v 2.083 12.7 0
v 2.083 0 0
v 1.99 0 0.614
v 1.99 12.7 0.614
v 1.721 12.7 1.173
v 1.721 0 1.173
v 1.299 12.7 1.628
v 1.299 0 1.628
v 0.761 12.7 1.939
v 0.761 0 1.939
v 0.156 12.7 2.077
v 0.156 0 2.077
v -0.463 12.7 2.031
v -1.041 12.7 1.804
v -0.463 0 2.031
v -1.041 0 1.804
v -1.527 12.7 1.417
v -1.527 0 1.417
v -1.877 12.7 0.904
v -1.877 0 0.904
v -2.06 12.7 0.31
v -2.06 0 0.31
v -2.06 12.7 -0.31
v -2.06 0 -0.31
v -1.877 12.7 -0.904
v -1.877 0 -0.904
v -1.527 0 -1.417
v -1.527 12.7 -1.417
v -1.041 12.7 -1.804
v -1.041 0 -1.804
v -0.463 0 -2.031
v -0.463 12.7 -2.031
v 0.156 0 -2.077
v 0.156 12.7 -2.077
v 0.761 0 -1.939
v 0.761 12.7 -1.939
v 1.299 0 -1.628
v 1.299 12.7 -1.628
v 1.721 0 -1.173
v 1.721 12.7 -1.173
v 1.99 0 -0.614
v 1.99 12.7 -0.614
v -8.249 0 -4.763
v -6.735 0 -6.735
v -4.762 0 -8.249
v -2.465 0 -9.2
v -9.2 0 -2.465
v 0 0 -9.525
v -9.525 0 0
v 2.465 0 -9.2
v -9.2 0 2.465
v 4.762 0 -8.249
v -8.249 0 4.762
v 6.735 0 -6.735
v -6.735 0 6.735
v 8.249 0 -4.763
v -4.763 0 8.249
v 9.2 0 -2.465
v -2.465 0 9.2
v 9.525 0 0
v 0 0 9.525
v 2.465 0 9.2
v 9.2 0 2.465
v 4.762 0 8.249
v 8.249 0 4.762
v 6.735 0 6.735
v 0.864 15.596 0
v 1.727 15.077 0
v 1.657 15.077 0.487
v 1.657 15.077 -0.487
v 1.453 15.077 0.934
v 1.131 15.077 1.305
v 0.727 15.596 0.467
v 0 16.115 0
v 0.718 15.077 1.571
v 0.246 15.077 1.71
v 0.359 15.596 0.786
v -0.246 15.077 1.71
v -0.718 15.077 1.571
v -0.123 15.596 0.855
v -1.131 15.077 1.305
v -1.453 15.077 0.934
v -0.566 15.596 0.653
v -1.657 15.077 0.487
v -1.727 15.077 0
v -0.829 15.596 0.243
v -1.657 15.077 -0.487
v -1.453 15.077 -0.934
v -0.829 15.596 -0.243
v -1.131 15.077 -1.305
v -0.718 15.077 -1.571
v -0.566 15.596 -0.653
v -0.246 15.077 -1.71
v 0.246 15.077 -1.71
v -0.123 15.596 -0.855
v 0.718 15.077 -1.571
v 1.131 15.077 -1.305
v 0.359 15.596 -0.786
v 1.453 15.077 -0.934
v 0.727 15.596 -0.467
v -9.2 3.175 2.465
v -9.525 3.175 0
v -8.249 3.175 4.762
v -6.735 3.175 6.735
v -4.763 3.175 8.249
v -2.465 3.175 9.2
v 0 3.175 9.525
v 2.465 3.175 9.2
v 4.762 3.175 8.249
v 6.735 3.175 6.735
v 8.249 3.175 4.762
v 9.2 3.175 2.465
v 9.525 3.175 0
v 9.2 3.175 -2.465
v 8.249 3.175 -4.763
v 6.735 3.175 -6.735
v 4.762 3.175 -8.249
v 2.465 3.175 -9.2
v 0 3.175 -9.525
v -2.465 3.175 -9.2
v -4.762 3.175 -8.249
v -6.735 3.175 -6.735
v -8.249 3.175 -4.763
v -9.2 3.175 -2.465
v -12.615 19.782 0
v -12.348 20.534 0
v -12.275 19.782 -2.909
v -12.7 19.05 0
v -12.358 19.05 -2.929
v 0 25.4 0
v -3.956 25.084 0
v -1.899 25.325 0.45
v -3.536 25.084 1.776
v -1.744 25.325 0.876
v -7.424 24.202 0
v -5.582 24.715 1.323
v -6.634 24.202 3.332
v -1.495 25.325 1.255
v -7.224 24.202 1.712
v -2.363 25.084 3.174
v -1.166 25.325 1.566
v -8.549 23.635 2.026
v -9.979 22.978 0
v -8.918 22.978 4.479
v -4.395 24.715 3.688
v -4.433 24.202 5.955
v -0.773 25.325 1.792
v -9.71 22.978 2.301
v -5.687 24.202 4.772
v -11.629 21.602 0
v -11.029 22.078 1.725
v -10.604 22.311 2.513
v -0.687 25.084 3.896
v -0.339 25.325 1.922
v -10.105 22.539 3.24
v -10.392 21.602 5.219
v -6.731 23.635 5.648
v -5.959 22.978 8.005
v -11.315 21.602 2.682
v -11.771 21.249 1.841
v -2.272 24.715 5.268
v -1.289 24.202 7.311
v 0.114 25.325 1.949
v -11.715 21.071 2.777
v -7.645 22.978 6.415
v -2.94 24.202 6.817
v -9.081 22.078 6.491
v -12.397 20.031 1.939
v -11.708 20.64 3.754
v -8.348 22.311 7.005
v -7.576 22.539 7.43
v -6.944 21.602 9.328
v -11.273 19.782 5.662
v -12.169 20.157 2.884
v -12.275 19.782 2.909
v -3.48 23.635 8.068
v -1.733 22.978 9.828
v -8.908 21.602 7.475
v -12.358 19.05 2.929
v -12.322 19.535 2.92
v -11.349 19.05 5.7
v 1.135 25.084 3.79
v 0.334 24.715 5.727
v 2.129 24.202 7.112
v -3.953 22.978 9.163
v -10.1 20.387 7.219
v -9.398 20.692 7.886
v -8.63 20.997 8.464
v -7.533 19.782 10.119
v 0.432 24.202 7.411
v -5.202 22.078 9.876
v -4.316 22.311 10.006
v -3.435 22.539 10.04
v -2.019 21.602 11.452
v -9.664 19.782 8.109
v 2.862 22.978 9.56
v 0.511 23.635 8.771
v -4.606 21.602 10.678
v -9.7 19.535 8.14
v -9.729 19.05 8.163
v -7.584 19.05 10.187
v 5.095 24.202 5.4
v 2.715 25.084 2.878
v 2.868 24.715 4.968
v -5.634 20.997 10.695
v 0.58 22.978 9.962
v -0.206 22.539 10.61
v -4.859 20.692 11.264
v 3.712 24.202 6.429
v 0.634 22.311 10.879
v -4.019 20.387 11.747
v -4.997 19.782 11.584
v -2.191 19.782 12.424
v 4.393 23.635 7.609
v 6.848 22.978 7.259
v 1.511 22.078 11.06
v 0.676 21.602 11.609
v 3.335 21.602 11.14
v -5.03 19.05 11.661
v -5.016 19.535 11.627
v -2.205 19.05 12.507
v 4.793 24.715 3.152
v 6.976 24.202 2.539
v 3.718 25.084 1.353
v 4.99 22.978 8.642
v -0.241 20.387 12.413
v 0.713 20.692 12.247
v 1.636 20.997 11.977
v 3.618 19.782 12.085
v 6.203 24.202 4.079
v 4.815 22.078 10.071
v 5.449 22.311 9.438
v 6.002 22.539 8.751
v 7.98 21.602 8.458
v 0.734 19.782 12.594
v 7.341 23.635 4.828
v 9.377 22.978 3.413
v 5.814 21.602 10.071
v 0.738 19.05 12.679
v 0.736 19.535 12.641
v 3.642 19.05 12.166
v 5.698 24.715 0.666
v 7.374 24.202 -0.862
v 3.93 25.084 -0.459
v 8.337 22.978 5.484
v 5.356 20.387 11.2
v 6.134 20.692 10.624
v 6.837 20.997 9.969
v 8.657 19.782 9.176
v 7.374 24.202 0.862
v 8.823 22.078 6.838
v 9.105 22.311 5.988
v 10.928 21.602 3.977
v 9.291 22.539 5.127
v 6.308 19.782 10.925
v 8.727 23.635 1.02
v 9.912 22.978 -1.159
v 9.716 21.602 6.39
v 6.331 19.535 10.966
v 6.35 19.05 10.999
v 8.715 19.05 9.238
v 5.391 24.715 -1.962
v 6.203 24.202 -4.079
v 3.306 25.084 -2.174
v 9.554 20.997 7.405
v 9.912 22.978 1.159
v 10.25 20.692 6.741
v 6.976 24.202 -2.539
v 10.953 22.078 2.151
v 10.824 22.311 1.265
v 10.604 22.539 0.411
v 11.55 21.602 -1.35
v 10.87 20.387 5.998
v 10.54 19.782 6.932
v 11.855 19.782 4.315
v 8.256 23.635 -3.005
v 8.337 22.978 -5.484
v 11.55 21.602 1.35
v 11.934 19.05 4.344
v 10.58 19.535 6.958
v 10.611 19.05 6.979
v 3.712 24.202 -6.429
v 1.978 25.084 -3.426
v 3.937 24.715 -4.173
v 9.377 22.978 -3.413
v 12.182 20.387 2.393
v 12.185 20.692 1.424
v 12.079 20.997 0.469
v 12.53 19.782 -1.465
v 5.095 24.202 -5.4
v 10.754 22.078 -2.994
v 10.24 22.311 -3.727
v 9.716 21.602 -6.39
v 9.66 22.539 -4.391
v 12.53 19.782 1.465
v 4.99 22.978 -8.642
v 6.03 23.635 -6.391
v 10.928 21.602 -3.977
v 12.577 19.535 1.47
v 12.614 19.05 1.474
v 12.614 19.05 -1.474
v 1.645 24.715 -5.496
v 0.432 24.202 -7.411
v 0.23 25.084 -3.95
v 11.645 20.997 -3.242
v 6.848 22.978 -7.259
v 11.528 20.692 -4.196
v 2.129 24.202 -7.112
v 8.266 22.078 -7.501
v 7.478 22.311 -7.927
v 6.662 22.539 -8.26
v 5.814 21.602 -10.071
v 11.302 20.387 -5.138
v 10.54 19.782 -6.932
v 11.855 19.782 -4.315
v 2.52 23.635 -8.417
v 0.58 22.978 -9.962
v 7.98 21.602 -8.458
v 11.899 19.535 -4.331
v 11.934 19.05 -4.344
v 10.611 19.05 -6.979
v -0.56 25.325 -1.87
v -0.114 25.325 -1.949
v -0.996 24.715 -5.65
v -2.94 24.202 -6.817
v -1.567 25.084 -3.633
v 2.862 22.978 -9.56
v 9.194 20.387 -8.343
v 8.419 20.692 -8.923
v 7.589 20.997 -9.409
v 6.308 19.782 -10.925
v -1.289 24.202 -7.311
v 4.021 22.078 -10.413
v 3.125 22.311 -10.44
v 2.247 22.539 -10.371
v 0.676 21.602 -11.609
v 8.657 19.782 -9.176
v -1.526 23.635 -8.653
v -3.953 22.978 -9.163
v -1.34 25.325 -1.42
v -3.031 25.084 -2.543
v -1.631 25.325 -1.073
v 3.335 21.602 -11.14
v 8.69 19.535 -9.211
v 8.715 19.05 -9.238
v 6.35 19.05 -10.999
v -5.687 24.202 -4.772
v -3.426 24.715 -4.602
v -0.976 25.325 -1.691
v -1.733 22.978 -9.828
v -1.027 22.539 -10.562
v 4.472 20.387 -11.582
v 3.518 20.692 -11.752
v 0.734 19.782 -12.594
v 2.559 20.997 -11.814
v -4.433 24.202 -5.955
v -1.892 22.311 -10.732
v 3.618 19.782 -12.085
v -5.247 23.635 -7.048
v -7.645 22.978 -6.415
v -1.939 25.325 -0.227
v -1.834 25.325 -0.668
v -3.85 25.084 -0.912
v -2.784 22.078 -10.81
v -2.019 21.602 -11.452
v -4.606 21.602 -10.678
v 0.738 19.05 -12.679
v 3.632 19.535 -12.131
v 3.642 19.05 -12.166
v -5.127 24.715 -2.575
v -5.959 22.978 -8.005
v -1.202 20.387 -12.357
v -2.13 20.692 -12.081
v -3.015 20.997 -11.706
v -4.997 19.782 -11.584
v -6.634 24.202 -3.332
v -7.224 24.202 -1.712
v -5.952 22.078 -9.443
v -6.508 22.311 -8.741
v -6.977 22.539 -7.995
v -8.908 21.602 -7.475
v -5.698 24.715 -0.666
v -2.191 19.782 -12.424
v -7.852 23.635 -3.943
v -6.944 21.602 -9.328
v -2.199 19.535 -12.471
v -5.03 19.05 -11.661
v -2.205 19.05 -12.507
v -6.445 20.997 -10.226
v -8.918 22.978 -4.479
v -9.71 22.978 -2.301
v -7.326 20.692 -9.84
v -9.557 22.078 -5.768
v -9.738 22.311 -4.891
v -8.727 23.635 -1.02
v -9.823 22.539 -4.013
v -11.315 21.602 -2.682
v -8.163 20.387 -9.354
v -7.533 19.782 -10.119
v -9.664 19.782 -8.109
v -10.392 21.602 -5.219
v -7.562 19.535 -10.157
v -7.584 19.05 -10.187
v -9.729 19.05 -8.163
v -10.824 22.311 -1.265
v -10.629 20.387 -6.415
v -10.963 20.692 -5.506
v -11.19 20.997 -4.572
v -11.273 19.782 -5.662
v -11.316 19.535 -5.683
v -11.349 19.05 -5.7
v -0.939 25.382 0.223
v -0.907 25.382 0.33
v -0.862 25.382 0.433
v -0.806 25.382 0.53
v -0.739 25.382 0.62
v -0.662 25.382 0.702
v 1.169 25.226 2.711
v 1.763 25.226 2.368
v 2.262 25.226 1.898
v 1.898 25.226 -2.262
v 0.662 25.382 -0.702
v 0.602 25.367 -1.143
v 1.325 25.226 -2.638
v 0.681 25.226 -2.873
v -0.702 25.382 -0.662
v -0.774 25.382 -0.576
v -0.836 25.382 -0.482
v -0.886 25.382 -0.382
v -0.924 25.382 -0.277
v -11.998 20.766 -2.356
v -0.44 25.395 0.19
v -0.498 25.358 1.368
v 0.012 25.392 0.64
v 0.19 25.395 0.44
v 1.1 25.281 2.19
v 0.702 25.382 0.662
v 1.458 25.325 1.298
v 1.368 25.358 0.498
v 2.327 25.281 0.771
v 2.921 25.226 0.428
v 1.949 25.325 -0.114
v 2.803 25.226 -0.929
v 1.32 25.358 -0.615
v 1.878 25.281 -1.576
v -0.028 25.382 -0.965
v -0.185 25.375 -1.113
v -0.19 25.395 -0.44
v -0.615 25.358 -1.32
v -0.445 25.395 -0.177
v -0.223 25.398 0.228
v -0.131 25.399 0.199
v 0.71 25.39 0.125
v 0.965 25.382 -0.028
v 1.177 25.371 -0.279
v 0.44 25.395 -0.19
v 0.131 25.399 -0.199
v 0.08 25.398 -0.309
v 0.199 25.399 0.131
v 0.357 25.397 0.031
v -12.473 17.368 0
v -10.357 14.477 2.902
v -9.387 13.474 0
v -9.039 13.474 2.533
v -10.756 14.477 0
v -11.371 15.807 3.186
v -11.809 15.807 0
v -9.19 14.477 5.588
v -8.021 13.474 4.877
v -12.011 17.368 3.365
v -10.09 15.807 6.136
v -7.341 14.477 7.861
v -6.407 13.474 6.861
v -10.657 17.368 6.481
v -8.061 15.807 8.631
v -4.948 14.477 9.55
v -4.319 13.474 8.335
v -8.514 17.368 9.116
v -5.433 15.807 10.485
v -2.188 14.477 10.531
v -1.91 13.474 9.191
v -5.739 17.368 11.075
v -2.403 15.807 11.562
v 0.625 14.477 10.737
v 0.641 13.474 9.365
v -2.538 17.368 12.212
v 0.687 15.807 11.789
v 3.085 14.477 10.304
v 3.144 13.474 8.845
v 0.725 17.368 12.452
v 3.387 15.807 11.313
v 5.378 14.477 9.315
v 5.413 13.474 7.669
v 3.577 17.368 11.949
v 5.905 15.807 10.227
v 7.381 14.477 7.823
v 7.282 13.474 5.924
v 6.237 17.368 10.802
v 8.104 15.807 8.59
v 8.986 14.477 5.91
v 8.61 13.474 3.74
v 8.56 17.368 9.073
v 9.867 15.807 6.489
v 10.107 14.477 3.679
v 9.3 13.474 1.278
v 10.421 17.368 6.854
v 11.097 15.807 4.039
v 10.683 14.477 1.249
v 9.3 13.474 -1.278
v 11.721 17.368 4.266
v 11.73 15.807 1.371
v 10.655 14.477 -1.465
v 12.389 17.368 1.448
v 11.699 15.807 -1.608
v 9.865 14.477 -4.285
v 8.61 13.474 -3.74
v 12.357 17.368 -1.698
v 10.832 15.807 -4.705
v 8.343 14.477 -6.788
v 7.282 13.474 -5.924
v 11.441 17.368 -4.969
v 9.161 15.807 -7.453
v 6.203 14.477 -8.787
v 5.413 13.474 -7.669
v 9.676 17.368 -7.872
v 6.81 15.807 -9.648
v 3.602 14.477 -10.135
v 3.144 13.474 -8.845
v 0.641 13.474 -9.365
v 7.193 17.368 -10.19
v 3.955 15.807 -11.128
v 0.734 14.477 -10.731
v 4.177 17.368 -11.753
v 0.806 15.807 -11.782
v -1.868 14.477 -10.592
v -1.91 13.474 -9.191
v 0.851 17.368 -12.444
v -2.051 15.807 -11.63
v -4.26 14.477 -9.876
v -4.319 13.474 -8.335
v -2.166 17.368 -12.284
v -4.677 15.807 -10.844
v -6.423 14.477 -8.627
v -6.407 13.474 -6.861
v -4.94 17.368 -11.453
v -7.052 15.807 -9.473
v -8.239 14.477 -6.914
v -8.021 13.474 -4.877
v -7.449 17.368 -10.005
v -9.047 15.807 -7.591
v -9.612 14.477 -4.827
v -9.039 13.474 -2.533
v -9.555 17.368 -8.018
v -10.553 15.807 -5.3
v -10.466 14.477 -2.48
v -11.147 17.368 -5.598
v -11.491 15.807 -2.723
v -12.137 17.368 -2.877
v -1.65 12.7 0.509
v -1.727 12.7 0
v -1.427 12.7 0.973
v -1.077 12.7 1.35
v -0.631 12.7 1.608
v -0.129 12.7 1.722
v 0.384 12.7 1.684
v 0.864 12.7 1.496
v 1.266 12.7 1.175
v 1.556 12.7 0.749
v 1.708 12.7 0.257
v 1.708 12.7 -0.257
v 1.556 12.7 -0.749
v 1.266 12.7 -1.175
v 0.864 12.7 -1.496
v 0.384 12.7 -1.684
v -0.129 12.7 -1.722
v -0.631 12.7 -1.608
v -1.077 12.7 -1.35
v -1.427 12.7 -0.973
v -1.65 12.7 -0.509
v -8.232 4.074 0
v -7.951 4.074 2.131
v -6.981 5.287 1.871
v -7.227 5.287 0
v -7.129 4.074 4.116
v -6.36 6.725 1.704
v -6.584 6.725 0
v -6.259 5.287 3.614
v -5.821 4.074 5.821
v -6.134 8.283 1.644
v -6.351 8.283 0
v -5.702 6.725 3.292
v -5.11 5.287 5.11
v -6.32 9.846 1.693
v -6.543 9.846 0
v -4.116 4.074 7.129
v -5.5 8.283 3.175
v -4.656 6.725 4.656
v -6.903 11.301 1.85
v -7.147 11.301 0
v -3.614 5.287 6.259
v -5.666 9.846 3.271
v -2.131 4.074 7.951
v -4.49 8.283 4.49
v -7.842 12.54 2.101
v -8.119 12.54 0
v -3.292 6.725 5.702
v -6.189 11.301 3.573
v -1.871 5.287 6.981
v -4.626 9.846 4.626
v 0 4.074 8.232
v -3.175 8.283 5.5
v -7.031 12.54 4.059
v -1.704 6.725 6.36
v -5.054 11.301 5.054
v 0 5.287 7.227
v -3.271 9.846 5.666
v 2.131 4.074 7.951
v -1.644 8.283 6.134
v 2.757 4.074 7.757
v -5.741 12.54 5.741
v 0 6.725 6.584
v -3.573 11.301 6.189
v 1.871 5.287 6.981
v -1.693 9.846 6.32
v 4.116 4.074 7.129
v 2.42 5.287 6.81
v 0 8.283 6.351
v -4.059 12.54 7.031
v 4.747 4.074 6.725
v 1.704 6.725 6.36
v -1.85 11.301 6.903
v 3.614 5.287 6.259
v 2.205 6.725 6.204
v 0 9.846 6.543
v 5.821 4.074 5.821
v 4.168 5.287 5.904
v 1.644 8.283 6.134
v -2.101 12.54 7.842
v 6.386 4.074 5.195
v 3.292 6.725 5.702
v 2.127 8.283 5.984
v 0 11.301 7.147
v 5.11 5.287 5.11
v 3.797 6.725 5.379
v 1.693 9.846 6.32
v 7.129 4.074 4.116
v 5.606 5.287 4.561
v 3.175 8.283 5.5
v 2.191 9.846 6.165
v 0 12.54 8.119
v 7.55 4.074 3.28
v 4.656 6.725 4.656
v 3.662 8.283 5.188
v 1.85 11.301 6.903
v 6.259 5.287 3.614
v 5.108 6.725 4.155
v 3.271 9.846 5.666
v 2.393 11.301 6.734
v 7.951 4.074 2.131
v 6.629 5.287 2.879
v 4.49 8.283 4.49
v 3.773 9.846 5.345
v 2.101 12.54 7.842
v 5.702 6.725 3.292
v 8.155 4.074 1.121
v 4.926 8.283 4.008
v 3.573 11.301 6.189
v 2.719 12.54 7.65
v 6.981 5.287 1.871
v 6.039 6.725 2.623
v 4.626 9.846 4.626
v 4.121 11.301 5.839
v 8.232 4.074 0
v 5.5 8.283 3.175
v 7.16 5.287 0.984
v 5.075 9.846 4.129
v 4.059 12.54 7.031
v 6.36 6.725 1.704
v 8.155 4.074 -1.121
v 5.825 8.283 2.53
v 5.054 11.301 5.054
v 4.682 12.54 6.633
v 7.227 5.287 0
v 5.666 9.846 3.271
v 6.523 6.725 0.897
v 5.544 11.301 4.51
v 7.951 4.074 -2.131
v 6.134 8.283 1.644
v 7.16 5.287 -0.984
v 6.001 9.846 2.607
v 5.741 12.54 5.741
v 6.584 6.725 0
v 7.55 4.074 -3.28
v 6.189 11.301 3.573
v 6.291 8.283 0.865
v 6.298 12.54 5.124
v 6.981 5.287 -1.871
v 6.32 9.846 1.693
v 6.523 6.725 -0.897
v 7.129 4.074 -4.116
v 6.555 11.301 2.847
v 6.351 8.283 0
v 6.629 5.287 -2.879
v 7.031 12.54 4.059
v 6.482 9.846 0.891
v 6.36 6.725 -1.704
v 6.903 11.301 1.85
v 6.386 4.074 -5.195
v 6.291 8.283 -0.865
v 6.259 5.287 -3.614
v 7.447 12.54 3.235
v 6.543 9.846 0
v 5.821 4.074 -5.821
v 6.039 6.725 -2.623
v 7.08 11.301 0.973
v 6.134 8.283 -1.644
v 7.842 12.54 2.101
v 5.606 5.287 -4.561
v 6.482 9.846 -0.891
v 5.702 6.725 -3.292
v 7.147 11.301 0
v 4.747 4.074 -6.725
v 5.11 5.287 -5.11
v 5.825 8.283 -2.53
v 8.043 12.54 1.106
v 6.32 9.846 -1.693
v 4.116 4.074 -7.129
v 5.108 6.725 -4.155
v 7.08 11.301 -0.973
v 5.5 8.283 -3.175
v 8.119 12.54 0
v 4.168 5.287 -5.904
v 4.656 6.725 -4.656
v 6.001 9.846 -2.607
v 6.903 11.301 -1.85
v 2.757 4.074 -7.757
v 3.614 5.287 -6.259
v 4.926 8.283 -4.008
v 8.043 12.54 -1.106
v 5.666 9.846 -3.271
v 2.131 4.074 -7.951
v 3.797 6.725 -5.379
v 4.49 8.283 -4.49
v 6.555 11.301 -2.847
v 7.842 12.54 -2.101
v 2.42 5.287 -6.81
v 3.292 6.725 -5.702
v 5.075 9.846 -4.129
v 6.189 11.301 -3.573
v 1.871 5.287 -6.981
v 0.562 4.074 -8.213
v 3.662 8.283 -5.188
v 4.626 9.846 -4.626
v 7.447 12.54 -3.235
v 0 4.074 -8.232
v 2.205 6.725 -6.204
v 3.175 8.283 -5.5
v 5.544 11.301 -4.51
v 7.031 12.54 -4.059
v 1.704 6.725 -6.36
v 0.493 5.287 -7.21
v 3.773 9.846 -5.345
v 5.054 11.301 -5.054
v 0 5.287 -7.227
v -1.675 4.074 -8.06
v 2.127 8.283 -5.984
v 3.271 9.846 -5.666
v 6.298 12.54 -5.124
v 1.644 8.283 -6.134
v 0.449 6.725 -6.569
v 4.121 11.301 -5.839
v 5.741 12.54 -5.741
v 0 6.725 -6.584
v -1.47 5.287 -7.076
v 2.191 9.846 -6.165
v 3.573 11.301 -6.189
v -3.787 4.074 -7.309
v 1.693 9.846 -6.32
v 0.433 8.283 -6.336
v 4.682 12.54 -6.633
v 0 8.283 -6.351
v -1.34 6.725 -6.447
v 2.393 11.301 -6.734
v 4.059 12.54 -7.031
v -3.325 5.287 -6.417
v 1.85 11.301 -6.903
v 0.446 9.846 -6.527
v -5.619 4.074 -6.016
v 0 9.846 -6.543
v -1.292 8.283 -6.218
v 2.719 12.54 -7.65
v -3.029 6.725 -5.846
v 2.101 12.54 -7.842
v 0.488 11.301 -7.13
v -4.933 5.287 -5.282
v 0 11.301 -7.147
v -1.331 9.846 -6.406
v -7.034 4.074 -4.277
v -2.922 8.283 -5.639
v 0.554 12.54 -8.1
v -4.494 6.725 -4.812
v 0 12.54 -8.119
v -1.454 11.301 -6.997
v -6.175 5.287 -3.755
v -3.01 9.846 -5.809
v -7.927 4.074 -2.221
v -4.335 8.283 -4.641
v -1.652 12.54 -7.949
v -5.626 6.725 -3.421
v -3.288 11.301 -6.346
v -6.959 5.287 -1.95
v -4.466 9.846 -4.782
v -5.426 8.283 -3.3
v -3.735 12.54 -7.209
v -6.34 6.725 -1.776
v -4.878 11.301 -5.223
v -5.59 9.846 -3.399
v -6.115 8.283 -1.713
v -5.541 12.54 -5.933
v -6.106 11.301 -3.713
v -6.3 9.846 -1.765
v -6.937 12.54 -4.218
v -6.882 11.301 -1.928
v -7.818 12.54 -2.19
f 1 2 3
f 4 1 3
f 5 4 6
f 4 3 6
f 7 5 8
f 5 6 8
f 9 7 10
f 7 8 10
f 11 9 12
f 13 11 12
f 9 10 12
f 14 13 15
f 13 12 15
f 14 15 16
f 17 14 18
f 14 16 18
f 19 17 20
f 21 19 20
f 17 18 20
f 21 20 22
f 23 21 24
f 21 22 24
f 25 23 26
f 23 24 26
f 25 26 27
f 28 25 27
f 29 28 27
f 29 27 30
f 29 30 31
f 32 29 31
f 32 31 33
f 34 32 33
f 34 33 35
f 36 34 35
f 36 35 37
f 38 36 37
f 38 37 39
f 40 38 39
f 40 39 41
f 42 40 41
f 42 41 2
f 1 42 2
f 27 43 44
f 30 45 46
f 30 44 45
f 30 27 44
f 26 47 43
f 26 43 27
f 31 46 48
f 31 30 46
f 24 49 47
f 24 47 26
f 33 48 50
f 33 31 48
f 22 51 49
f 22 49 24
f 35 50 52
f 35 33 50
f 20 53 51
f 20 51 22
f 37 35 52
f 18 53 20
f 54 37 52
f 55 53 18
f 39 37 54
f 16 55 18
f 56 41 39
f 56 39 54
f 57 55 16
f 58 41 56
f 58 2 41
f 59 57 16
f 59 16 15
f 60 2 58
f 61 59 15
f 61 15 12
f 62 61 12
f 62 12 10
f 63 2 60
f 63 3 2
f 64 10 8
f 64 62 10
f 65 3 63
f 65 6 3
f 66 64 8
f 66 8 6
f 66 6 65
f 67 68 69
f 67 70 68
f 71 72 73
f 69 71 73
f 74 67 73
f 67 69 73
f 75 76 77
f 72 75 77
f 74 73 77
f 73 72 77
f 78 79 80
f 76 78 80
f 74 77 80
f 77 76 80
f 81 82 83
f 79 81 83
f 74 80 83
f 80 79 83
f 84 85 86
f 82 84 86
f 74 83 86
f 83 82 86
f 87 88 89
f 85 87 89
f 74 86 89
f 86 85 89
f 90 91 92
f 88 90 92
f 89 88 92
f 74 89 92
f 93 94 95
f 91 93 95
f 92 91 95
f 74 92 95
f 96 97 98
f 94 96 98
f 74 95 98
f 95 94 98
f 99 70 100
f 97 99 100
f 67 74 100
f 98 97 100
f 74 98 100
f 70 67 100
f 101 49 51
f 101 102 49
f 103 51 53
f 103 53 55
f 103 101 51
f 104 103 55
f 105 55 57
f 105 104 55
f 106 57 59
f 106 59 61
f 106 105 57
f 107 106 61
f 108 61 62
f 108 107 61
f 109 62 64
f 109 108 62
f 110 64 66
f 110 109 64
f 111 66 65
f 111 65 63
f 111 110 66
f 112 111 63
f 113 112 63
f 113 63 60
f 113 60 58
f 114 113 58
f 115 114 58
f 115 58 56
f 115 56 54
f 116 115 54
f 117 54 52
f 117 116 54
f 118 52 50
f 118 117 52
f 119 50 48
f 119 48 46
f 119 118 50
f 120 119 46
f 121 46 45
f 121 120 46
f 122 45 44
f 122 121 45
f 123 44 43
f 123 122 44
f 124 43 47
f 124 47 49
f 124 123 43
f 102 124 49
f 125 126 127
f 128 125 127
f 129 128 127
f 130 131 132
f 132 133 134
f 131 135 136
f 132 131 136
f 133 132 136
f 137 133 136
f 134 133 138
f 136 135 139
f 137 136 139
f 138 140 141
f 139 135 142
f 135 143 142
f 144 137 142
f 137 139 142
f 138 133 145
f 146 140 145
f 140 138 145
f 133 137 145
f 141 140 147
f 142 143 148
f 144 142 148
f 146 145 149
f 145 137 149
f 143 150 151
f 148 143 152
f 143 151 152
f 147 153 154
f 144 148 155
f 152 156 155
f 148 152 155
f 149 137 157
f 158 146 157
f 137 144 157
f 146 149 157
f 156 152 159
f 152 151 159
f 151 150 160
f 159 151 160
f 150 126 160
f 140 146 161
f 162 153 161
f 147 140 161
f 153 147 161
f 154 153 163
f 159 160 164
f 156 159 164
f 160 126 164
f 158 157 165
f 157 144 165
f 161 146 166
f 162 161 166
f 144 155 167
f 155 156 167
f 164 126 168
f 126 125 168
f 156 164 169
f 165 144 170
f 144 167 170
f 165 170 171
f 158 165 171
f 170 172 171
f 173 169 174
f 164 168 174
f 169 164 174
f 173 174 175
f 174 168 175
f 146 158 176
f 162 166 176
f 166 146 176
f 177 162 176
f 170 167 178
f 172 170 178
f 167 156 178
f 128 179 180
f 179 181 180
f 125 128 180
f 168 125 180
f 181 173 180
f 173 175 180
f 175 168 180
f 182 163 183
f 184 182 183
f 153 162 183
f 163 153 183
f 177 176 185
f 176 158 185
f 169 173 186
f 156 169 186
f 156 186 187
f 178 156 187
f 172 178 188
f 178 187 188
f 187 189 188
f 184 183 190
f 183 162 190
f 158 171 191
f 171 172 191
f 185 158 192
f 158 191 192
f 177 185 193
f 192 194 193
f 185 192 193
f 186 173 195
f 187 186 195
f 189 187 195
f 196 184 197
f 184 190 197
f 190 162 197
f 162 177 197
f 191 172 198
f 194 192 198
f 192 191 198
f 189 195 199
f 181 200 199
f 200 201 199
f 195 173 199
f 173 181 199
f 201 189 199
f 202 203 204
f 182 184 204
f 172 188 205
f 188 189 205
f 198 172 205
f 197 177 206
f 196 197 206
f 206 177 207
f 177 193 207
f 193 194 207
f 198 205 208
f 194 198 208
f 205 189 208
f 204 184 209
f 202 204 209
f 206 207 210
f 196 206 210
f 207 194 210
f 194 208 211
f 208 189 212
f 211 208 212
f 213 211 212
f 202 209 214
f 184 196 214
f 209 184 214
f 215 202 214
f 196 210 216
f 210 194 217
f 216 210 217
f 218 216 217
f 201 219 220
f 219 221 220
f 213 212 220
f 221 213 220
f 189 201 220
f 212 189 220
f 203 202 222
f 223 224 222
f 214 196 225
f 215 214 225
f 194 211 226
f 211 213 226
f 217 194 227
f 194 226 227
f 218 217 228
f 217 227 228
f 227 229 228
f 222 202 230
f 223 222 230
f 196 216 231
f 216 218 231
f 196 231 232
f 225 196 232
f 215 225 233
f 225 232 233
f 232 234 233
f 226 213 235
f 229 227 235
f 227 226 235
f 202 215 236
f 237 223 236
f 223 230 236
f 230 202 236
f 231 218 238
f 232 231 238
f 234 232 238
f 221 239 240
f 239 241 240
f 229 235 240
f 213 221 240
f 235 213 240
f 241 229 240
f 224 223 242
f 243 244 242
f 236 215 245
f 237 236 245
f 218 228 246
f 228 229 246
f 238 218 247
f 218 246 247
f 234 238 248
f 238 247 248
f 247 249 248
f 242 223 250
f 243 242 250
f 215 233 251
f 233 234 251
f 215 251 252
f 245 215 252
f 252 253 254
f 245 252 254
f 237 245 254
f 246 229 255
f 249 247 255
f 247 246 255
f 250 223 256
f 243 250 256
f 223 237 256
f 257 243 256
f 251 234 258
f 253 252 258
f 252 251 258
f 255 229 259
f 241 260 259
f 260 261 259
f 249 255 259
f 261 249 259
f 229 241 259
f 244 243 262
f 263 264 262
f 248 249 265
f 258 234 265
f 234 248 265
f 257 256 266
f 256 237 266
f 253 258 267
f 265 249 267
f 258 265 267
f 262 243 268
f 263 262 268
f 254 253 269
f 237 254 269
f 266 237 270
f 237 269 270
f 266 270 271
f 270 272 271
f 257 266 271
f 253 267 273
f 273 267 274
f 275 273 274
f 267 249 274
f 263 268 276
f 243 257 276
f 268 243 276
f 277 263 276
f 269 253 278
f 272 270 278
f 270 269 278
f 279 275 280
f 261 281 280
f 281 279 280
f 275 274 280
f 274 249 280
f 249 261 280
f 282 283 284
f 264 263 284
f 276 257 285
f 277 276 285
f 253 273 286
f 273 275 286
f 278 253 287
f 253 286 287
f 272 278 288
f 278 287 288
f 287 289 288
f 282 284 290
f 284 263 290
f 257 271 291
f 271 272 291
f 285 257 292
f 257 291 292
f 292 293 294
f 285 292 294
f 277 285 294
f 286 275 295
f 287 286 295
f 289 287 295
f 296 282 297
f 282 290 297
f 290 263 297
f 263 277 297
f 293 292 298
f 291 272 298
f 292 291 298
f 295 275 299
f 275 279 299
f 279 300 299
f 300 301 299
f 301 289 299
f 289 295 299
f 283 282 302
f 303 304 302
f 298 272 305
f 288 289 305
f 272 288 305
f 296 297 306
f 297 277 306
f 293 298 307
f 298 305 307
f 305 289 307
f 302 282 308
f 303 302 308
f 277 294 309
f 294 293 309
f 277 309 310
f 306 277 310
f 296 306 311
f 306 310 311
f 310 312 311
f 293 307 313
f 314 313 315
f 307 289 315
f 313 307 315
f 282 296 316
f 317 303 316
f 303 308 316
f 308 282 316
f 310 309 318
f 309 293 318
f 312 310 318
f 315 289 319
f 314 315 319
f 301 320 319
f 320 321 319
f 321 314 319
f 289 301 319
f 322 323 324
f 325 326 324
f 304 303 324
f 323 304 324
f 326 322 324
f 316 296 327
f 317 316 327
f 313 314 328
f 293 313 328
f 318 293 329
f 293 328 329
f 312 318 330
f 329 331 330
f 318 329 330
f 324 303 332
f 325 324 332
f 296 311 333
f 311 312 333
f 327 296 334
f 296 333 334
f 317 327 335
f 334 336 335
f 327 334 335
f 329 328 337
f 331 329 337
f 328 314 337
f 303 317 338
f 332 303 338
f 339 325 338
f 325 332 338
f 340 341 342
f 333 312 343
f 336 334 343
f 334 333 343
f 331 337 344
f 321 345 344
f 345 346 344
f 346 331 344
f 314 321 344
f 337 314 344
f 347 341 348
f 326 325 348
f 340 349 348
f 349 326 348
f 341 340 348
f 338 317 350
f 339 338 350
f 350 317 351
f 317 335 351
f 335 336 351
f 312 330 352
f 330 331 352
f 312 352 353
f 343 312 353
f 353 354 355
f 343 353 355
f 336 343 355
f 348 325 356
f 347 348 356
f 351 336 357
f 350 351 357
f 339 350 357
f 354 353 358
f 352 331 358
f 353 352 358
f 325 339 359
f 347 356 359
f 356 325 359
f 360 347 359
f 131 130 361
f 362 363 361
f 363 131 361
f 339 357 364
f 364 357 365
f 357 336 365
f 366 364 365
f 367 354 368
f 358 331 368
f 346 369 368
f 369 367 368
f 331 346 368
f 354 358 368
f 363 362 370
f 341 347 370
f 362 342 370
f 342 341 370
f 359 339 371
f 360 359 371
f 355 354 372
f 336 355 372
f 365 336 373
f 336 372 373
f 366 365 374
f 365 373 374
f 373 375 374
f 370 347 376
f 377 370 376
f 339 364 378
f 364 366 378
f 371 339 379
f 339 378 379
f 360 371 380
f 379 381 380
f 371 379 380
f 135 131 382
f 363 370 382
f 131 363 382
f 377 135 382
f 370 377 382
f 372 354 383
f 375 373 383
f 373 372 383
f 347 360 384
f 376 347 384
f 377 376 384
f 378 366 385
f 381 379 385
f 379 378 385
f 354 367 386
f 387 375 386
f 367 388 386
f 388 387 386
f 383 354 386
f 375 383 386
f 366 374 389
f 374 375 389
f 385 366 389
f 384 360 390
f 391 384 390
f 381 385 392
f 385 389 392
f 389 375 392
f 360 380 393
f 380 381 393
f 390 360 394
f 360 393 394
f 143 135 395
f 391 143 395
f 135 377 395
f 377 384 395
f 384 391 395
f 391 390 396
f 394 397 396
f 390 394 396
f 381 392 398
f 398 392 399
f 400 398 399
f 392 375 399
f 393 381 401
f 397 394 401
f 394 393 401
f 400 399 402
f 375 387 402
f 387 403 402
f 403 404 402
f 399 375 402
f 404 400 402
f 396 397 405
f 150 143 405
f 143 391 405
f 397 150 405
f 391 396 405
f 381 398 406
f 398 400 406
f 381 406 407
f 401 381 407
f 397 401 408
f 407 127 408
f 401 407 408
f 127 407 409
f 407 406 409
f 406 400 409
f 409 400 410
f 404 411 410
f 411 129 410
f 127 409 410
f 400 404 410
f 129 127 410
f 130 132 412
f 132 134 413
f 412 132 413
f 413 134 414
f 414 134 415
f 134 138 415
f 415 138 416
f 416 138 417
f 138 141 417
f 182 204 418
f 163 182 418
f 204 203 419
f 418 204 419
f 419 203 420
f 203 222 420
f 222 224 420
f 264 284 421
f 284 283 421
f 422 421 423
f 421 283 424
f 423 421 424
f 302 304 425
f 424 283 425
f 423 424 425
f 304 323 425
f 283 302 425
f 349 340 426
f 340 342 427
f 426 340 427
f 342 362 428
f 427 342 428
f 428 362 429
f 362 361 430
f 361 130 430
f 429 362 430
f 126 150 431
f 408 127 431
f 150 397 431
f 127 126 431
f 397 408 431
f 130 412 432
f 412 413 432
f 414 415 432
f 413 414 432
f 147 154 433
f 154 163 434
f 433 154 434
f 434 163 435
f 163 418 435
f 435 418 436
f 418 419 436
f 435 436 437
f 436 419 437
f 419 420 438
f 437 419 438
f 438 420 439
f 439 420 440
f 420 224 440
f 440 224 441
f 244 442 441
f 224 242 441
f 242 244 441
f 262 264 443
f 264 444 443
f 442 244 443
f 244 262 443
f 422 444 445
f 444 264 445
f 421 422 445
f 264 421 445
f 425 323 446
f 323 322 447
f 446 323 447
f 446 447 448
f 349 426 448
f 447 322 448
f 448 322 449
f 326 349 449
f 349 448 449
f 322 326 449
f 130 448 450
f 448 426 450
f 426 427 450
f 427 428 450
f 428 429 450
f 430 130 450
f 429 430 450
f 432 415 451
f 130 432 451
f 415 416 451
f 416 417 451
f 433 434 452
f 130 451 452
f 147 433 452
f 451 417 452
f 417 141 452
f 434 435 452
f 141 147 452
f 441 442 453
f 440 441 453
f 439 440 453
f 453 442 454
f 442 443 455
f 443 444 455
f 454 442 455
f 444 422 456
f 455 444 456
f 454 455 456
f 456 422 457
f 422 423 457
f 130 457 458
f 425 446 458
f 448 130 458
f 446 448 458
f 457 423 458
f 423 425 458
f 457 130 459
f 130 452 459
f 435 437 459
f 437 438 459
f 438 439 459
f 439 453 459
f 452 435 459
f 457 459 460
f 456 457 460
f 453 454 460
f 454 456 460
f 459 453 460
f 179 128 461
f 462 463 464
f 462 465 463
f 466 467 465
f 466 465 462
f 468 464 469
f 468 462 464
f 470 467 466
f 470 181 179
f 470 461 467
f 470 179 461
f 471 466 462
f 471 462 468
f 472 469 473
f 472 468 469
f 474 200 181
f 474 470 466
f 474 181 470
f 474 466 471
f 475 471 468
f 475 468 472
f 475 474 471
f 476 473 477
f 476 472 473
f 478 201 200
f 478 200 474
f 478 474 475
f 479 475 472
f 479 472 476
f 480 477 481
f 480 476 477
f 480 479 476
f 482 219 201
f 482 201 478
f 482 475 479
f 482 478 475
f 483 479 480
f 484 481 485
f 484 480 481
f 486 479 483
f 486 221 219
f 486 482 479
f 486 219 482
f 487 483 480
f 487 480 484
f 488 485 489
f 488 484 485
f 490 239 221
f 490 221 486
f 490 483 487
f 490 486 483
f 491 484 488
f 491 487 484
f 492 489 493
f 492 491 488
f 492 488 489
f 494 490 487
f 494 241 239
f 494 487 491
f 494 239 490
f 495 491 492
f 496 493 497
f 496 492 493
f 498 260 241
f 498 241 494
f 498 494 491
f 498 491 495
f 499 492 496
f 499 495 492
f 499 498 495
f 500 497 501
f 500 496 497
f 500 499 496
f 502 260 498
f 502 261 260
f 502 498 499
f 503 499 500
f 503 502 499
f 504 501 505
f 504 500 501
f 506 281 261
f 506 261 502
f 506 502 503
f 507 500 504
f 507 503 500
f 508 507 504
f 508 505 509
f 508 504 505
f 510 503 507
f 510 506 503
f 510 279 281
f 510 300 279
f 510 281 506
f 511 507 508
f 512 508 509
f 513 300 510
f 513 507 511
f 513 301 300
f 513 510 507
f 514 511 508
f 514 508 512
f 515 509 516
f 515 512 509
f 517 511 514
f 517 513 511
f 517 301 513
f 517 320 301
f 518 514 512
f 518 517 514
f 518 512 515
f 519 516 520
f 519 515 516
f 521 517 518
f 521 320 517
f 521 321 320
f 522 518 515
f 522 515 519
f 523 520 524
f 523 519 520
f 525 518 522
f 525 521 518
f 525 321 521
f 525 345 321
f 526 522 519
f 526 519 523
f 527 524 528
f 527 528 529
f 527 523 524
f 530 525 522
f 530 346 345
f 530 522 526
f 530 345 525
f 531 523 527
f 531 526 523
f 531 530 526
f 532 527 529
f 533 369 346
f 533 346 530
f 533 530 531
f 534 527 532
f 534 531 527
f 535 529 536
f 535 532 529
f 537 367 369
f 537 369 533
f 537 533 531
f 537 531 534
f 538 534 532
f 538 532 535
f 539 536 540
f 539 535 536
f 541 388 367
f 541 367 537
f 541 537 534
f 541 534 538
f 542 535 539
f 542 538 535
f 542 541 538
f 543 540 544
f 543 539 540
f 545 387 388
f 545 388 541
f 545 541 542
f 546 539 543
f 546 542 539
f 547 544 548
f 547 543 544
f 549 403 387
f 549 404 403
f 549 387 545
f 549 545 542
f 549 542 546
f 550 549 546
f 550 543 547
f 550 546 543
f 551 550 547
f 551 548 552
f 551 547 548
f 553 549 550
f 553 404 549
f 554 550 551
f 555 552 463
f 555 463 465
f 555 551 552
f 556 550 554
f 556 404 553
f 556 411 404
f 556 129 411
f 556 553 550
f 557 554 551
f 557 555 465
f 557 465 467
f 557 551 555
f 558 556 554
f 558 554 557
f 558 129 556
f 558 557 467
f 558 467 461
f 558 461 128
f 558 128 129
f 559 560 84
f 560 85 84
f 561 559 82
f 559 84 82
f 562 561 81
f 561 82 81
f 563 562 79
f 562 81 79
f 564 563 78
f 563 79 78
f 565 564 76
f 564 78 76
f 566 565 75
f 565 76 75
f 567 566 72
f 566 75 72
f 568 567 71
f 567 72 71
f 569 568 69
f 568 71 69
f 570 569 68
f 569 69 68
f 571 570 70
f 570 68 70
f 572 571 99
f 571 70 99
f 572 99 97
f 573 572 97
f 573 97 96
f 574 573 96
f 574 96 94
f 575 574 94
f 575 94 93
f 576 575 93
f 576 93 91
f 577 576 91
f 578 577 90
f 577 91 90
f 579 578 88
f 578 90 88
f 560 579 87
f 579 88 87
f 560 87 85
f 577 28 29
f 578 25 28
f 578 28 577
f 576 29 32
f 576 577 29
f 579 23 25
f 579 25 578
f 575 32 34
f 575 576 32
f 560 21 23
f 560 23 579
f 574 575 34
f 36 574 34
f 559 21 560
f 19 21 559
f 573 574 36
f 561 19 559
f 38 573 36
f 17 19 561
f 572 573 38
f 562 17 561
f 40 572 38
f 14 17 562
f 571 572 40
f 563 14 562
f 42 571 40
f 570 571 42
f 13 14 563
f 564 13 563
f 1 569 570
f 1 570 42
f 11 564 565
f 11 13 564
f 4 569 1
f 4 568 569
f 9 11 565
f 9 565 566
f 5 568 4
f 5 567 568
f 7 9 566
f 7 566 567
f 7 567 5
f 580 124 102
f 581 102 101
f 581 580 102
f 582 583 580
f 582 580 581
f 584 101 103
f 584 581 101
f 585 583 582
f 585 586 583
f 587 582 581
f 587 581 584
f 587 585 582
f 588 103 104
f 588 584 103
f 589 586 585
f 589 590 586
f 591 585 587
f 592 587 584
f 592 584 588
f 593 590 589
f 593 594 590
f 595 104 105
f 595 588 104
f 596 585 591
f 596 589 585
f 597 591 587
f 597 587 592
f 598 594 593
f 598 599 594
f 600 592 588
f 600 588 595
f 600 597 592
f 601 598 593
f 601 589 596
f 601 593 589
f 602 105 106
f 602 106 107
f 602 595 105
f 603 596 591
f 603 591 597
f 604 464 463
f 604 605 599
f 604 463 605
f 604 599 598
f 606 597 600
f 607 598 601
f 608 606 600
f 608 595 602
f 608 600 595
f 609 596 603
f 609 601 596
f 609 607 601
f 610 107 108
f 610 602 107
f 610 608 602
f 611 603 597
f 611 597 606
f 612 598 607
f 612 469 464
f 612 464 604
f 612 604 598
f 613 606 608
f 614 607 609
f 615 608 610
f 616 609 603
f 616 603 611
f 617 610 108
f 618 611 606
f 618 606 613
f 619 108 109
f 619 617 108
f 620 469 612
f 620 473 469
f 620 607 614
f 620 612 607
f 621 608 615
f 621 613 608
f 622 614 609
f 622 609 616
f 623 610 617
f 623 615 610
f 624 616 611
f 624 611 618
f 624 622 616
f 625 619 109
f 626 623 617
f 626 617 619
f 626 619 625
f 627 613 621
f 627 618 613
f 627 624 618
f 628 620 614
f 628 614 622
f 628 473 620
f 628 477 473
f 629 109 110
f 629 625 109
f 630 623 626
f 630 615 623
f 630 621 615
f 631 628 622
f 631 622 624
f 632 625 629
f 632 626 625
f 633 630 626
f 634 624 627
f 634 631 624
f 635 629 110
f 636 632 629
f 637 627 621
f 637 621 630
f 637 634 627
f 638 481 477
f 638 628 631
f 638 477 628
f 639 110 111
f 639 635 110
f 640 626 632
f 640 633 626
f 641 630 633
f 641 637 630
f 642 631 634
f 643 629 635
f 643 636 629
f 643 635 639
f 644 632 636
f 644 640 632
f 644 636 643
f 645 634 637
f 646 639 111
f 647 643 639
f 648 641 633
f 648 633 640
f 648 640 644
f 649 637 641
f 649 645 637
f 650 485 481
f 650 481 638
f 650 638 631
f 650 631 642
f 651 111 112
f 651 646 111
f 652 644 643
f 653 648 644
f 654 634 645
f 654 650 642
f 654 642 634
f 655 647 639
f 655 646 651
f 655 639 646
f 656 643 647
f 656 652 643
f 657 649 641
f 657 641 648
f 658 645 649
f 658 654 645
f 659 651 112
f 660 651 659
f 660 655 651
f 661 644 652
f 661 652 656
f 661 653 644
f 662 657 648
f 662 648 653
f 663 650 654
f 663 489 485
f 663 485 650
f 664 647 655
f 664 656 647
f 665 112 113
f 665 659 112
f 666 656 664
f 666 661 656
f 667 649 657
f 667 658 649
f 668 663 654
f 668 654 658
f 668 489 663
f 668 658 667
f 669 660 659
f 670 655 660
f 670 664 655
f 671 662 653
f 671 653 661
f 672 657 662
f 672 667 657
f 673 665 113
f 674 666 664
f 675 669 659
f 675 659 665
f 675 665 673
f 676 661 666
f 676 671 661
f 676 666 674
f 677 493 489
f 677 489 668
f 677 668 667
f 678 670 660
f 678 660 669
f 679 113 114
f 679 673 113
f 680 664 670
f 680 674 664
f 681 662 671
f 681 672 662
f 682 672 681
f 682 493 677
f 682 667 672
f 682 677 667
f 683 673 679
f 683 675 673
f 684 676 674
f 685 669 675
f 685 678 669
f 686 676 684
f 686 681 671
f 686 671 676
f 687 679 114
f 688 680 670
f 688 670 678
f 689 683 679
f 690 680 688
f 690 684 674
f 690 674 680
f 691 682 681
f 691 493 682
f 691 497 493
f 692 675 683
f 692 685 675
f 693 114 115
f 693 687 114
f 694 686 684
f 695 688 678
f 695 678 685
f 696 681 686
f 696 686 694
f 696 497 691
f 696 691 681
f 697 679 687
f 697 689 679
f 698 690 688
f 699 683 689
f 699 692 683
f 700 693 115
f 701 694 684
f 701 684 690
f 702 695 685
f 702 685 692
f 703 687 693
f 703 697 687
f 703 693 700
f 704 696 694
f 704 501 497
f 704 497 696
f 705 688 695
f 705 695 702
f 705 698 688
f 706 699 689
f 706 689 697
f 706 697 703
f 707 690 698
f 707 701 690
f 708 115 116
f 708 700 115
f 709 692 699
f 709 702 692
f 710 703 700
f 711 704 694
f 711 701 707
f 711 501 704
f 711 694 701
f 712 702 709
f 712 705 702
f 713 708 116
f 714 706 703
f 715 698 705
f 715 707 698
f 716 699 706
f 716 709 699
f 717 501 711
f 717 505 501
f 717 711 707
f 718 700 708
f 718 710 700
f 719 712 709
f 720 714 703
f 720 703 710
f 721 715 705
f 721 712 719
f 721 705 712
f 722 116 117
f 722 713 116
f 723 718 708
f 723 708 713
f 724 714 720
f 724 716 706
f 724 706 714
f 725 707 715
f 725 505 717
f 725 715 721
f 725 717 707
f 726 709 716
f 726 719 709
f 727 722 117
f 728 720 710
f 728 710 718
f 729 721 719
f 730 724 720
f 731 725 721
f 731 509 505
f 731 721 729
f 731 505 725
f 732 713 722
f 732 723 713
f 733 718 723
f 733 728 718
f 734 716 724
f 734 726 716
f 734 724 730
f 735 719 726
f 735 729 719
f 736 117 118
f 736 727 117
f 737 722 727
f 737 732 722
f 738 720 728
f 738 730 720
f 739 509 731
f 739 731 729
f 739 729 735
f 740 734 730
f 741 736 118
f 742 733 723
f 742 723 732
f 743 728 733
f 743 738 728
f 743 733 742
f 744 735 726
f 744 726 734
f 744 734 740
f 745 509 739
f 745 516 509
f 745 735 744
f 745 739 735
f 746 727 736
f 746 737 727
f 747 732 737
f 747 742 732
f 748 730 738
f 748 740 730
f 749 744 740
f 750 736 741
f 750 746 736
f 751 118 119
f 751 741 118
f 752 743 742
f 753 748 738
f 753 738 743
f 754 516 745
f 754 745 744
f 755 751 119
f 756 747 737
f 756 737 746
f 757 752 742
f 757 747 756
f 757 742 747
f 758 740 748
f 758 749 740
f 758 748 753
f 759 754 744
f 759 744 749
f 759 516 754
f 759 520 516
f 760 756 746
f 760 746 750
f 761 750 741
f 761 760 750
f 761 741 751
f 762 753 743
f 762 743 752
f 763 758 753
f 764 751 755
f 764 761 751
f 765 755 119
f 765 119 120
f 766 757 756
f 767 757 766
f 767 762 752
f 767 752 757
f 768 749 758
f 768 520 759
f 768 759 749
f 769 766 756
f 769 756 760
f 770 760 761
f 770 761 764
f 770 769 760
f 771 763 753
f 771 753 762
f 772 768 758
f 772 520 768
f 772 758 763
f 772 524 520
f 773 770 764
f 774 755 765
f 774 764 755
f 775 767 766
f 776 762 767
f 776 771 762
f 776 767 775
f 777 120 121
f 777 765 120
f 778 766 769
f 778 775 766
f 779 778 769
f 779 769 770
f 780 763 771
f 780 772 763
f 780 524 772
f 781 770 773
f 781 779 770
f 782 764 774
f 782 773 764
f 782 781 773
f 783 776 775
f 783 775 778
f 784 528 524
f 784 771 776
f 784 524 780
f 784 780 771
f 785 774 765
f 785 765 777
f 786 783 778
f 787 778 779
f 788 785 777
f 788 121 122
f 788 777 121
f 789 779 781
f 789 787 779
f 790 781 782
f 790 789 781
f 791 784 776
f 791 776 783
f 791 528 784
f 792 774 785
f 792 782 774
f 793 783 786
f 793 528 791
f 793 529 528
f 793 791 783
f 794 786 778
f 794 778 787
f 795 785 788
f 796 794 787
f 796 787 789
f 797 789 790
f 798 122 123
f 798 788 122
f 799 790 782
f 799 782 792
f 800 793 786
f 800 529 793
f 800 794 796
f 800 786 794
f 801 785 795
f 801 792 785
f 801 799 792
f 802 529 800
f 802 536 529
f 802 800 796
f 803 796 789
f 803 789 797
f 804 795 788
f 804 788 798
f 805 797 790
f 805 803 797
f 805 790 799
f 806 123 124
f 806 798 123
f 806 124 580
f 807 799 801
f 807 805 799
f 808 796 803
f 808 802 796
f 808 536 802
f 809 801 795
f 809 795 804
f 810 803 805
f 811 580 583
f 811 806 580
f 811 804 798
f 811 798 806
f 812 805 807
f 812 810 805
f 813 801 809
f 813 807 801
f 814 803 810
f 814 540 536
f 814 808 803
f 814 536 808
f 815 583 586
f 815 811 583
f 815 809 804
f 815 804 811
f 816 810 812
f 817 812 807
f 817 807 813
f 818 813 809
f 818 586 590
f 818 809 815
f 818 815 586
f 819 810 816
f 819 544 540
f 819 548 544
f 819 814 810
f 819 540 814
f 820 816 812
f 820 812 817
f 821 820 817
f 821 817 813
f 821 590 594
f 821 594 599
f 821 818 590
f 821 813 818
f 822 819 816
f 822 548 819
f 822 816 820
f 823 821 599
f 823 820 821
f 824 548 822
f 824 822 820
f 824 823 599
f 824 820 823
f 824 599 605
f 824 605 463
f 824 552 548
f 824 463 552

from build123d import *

# Parameters (mm, degrees)
F_8_32_TAPPED_HOLE1_D           = 3.4544
F_8_32_TAPPED_HOLE1_DEPTH       = 15.07744
F_8_32_TAPPED_HOLE1_CBORE_D     = 4.1656
F_8_32_TAPPED_HOLE1_CBORE_DEPTH = 12.7
F_8_32_TAPPED_HOLE1_TIP         = 1.037806461


with BuildPart() as part:
    # Sketch1 → Base-Revolve (revolve)
    with BuildSketch(Plane.XY):
        with BuildLine():
            Line((0, 0), (-9.525, 0))
            Line((-9.525, 0), (-9.525, 3.175))
            ThreePointArc((-9.525, 3.175), (-6.350520234, 8.282737448), (-9.387318408, 13.47351393))
            ThreePointArc((-9.387318408, 13.47351393), (-11.809371387, 15.806889756), (-12.7, 19.05))
            add(Edge.make_bspline(
                [(0, 25.4), (-12.7, 25.4), (-12.7, 19.05)],
                knots=[4.71238898, 4.71238898, 4.71238898, 6.283185307, 6.283185307, 6.283185307], degree=2, weights=[1, 0.707106781, 1]))
            Line((0, 25.4), (0, 0))
        make_face()
    revolve(axis=Axis((0, 0, 0), (0, 1, 0)))

    # #8-32 Tapped Hole1
    with Locations(Plane.XZ):
        with Locations((0, 0)):
            CounterBoreHole(F_8_32_TAPPED_HOLE1_D / 2, F_8_32_TAPPED_HOLE1_CBORE_D / 2, F_8_32_TAPPED_HOLE1_CBORE_DEPTH, depth=F_8_32_TAPPED_HOLE1_DEPTH)
            with Locations((0, 0, -(F_8_32_TAPPED_HOLE1_DEPTH + F_8_32_TAPPED_HOLE1_TIP / 2))):  # 118° drill point
                Cone(0, F_8_32_TAPPED_HOLE1_D / 2, F_8_32_TAPPED_HOLE1_TIP, mode=Mode.SUBTRACT)


solid = part.part
